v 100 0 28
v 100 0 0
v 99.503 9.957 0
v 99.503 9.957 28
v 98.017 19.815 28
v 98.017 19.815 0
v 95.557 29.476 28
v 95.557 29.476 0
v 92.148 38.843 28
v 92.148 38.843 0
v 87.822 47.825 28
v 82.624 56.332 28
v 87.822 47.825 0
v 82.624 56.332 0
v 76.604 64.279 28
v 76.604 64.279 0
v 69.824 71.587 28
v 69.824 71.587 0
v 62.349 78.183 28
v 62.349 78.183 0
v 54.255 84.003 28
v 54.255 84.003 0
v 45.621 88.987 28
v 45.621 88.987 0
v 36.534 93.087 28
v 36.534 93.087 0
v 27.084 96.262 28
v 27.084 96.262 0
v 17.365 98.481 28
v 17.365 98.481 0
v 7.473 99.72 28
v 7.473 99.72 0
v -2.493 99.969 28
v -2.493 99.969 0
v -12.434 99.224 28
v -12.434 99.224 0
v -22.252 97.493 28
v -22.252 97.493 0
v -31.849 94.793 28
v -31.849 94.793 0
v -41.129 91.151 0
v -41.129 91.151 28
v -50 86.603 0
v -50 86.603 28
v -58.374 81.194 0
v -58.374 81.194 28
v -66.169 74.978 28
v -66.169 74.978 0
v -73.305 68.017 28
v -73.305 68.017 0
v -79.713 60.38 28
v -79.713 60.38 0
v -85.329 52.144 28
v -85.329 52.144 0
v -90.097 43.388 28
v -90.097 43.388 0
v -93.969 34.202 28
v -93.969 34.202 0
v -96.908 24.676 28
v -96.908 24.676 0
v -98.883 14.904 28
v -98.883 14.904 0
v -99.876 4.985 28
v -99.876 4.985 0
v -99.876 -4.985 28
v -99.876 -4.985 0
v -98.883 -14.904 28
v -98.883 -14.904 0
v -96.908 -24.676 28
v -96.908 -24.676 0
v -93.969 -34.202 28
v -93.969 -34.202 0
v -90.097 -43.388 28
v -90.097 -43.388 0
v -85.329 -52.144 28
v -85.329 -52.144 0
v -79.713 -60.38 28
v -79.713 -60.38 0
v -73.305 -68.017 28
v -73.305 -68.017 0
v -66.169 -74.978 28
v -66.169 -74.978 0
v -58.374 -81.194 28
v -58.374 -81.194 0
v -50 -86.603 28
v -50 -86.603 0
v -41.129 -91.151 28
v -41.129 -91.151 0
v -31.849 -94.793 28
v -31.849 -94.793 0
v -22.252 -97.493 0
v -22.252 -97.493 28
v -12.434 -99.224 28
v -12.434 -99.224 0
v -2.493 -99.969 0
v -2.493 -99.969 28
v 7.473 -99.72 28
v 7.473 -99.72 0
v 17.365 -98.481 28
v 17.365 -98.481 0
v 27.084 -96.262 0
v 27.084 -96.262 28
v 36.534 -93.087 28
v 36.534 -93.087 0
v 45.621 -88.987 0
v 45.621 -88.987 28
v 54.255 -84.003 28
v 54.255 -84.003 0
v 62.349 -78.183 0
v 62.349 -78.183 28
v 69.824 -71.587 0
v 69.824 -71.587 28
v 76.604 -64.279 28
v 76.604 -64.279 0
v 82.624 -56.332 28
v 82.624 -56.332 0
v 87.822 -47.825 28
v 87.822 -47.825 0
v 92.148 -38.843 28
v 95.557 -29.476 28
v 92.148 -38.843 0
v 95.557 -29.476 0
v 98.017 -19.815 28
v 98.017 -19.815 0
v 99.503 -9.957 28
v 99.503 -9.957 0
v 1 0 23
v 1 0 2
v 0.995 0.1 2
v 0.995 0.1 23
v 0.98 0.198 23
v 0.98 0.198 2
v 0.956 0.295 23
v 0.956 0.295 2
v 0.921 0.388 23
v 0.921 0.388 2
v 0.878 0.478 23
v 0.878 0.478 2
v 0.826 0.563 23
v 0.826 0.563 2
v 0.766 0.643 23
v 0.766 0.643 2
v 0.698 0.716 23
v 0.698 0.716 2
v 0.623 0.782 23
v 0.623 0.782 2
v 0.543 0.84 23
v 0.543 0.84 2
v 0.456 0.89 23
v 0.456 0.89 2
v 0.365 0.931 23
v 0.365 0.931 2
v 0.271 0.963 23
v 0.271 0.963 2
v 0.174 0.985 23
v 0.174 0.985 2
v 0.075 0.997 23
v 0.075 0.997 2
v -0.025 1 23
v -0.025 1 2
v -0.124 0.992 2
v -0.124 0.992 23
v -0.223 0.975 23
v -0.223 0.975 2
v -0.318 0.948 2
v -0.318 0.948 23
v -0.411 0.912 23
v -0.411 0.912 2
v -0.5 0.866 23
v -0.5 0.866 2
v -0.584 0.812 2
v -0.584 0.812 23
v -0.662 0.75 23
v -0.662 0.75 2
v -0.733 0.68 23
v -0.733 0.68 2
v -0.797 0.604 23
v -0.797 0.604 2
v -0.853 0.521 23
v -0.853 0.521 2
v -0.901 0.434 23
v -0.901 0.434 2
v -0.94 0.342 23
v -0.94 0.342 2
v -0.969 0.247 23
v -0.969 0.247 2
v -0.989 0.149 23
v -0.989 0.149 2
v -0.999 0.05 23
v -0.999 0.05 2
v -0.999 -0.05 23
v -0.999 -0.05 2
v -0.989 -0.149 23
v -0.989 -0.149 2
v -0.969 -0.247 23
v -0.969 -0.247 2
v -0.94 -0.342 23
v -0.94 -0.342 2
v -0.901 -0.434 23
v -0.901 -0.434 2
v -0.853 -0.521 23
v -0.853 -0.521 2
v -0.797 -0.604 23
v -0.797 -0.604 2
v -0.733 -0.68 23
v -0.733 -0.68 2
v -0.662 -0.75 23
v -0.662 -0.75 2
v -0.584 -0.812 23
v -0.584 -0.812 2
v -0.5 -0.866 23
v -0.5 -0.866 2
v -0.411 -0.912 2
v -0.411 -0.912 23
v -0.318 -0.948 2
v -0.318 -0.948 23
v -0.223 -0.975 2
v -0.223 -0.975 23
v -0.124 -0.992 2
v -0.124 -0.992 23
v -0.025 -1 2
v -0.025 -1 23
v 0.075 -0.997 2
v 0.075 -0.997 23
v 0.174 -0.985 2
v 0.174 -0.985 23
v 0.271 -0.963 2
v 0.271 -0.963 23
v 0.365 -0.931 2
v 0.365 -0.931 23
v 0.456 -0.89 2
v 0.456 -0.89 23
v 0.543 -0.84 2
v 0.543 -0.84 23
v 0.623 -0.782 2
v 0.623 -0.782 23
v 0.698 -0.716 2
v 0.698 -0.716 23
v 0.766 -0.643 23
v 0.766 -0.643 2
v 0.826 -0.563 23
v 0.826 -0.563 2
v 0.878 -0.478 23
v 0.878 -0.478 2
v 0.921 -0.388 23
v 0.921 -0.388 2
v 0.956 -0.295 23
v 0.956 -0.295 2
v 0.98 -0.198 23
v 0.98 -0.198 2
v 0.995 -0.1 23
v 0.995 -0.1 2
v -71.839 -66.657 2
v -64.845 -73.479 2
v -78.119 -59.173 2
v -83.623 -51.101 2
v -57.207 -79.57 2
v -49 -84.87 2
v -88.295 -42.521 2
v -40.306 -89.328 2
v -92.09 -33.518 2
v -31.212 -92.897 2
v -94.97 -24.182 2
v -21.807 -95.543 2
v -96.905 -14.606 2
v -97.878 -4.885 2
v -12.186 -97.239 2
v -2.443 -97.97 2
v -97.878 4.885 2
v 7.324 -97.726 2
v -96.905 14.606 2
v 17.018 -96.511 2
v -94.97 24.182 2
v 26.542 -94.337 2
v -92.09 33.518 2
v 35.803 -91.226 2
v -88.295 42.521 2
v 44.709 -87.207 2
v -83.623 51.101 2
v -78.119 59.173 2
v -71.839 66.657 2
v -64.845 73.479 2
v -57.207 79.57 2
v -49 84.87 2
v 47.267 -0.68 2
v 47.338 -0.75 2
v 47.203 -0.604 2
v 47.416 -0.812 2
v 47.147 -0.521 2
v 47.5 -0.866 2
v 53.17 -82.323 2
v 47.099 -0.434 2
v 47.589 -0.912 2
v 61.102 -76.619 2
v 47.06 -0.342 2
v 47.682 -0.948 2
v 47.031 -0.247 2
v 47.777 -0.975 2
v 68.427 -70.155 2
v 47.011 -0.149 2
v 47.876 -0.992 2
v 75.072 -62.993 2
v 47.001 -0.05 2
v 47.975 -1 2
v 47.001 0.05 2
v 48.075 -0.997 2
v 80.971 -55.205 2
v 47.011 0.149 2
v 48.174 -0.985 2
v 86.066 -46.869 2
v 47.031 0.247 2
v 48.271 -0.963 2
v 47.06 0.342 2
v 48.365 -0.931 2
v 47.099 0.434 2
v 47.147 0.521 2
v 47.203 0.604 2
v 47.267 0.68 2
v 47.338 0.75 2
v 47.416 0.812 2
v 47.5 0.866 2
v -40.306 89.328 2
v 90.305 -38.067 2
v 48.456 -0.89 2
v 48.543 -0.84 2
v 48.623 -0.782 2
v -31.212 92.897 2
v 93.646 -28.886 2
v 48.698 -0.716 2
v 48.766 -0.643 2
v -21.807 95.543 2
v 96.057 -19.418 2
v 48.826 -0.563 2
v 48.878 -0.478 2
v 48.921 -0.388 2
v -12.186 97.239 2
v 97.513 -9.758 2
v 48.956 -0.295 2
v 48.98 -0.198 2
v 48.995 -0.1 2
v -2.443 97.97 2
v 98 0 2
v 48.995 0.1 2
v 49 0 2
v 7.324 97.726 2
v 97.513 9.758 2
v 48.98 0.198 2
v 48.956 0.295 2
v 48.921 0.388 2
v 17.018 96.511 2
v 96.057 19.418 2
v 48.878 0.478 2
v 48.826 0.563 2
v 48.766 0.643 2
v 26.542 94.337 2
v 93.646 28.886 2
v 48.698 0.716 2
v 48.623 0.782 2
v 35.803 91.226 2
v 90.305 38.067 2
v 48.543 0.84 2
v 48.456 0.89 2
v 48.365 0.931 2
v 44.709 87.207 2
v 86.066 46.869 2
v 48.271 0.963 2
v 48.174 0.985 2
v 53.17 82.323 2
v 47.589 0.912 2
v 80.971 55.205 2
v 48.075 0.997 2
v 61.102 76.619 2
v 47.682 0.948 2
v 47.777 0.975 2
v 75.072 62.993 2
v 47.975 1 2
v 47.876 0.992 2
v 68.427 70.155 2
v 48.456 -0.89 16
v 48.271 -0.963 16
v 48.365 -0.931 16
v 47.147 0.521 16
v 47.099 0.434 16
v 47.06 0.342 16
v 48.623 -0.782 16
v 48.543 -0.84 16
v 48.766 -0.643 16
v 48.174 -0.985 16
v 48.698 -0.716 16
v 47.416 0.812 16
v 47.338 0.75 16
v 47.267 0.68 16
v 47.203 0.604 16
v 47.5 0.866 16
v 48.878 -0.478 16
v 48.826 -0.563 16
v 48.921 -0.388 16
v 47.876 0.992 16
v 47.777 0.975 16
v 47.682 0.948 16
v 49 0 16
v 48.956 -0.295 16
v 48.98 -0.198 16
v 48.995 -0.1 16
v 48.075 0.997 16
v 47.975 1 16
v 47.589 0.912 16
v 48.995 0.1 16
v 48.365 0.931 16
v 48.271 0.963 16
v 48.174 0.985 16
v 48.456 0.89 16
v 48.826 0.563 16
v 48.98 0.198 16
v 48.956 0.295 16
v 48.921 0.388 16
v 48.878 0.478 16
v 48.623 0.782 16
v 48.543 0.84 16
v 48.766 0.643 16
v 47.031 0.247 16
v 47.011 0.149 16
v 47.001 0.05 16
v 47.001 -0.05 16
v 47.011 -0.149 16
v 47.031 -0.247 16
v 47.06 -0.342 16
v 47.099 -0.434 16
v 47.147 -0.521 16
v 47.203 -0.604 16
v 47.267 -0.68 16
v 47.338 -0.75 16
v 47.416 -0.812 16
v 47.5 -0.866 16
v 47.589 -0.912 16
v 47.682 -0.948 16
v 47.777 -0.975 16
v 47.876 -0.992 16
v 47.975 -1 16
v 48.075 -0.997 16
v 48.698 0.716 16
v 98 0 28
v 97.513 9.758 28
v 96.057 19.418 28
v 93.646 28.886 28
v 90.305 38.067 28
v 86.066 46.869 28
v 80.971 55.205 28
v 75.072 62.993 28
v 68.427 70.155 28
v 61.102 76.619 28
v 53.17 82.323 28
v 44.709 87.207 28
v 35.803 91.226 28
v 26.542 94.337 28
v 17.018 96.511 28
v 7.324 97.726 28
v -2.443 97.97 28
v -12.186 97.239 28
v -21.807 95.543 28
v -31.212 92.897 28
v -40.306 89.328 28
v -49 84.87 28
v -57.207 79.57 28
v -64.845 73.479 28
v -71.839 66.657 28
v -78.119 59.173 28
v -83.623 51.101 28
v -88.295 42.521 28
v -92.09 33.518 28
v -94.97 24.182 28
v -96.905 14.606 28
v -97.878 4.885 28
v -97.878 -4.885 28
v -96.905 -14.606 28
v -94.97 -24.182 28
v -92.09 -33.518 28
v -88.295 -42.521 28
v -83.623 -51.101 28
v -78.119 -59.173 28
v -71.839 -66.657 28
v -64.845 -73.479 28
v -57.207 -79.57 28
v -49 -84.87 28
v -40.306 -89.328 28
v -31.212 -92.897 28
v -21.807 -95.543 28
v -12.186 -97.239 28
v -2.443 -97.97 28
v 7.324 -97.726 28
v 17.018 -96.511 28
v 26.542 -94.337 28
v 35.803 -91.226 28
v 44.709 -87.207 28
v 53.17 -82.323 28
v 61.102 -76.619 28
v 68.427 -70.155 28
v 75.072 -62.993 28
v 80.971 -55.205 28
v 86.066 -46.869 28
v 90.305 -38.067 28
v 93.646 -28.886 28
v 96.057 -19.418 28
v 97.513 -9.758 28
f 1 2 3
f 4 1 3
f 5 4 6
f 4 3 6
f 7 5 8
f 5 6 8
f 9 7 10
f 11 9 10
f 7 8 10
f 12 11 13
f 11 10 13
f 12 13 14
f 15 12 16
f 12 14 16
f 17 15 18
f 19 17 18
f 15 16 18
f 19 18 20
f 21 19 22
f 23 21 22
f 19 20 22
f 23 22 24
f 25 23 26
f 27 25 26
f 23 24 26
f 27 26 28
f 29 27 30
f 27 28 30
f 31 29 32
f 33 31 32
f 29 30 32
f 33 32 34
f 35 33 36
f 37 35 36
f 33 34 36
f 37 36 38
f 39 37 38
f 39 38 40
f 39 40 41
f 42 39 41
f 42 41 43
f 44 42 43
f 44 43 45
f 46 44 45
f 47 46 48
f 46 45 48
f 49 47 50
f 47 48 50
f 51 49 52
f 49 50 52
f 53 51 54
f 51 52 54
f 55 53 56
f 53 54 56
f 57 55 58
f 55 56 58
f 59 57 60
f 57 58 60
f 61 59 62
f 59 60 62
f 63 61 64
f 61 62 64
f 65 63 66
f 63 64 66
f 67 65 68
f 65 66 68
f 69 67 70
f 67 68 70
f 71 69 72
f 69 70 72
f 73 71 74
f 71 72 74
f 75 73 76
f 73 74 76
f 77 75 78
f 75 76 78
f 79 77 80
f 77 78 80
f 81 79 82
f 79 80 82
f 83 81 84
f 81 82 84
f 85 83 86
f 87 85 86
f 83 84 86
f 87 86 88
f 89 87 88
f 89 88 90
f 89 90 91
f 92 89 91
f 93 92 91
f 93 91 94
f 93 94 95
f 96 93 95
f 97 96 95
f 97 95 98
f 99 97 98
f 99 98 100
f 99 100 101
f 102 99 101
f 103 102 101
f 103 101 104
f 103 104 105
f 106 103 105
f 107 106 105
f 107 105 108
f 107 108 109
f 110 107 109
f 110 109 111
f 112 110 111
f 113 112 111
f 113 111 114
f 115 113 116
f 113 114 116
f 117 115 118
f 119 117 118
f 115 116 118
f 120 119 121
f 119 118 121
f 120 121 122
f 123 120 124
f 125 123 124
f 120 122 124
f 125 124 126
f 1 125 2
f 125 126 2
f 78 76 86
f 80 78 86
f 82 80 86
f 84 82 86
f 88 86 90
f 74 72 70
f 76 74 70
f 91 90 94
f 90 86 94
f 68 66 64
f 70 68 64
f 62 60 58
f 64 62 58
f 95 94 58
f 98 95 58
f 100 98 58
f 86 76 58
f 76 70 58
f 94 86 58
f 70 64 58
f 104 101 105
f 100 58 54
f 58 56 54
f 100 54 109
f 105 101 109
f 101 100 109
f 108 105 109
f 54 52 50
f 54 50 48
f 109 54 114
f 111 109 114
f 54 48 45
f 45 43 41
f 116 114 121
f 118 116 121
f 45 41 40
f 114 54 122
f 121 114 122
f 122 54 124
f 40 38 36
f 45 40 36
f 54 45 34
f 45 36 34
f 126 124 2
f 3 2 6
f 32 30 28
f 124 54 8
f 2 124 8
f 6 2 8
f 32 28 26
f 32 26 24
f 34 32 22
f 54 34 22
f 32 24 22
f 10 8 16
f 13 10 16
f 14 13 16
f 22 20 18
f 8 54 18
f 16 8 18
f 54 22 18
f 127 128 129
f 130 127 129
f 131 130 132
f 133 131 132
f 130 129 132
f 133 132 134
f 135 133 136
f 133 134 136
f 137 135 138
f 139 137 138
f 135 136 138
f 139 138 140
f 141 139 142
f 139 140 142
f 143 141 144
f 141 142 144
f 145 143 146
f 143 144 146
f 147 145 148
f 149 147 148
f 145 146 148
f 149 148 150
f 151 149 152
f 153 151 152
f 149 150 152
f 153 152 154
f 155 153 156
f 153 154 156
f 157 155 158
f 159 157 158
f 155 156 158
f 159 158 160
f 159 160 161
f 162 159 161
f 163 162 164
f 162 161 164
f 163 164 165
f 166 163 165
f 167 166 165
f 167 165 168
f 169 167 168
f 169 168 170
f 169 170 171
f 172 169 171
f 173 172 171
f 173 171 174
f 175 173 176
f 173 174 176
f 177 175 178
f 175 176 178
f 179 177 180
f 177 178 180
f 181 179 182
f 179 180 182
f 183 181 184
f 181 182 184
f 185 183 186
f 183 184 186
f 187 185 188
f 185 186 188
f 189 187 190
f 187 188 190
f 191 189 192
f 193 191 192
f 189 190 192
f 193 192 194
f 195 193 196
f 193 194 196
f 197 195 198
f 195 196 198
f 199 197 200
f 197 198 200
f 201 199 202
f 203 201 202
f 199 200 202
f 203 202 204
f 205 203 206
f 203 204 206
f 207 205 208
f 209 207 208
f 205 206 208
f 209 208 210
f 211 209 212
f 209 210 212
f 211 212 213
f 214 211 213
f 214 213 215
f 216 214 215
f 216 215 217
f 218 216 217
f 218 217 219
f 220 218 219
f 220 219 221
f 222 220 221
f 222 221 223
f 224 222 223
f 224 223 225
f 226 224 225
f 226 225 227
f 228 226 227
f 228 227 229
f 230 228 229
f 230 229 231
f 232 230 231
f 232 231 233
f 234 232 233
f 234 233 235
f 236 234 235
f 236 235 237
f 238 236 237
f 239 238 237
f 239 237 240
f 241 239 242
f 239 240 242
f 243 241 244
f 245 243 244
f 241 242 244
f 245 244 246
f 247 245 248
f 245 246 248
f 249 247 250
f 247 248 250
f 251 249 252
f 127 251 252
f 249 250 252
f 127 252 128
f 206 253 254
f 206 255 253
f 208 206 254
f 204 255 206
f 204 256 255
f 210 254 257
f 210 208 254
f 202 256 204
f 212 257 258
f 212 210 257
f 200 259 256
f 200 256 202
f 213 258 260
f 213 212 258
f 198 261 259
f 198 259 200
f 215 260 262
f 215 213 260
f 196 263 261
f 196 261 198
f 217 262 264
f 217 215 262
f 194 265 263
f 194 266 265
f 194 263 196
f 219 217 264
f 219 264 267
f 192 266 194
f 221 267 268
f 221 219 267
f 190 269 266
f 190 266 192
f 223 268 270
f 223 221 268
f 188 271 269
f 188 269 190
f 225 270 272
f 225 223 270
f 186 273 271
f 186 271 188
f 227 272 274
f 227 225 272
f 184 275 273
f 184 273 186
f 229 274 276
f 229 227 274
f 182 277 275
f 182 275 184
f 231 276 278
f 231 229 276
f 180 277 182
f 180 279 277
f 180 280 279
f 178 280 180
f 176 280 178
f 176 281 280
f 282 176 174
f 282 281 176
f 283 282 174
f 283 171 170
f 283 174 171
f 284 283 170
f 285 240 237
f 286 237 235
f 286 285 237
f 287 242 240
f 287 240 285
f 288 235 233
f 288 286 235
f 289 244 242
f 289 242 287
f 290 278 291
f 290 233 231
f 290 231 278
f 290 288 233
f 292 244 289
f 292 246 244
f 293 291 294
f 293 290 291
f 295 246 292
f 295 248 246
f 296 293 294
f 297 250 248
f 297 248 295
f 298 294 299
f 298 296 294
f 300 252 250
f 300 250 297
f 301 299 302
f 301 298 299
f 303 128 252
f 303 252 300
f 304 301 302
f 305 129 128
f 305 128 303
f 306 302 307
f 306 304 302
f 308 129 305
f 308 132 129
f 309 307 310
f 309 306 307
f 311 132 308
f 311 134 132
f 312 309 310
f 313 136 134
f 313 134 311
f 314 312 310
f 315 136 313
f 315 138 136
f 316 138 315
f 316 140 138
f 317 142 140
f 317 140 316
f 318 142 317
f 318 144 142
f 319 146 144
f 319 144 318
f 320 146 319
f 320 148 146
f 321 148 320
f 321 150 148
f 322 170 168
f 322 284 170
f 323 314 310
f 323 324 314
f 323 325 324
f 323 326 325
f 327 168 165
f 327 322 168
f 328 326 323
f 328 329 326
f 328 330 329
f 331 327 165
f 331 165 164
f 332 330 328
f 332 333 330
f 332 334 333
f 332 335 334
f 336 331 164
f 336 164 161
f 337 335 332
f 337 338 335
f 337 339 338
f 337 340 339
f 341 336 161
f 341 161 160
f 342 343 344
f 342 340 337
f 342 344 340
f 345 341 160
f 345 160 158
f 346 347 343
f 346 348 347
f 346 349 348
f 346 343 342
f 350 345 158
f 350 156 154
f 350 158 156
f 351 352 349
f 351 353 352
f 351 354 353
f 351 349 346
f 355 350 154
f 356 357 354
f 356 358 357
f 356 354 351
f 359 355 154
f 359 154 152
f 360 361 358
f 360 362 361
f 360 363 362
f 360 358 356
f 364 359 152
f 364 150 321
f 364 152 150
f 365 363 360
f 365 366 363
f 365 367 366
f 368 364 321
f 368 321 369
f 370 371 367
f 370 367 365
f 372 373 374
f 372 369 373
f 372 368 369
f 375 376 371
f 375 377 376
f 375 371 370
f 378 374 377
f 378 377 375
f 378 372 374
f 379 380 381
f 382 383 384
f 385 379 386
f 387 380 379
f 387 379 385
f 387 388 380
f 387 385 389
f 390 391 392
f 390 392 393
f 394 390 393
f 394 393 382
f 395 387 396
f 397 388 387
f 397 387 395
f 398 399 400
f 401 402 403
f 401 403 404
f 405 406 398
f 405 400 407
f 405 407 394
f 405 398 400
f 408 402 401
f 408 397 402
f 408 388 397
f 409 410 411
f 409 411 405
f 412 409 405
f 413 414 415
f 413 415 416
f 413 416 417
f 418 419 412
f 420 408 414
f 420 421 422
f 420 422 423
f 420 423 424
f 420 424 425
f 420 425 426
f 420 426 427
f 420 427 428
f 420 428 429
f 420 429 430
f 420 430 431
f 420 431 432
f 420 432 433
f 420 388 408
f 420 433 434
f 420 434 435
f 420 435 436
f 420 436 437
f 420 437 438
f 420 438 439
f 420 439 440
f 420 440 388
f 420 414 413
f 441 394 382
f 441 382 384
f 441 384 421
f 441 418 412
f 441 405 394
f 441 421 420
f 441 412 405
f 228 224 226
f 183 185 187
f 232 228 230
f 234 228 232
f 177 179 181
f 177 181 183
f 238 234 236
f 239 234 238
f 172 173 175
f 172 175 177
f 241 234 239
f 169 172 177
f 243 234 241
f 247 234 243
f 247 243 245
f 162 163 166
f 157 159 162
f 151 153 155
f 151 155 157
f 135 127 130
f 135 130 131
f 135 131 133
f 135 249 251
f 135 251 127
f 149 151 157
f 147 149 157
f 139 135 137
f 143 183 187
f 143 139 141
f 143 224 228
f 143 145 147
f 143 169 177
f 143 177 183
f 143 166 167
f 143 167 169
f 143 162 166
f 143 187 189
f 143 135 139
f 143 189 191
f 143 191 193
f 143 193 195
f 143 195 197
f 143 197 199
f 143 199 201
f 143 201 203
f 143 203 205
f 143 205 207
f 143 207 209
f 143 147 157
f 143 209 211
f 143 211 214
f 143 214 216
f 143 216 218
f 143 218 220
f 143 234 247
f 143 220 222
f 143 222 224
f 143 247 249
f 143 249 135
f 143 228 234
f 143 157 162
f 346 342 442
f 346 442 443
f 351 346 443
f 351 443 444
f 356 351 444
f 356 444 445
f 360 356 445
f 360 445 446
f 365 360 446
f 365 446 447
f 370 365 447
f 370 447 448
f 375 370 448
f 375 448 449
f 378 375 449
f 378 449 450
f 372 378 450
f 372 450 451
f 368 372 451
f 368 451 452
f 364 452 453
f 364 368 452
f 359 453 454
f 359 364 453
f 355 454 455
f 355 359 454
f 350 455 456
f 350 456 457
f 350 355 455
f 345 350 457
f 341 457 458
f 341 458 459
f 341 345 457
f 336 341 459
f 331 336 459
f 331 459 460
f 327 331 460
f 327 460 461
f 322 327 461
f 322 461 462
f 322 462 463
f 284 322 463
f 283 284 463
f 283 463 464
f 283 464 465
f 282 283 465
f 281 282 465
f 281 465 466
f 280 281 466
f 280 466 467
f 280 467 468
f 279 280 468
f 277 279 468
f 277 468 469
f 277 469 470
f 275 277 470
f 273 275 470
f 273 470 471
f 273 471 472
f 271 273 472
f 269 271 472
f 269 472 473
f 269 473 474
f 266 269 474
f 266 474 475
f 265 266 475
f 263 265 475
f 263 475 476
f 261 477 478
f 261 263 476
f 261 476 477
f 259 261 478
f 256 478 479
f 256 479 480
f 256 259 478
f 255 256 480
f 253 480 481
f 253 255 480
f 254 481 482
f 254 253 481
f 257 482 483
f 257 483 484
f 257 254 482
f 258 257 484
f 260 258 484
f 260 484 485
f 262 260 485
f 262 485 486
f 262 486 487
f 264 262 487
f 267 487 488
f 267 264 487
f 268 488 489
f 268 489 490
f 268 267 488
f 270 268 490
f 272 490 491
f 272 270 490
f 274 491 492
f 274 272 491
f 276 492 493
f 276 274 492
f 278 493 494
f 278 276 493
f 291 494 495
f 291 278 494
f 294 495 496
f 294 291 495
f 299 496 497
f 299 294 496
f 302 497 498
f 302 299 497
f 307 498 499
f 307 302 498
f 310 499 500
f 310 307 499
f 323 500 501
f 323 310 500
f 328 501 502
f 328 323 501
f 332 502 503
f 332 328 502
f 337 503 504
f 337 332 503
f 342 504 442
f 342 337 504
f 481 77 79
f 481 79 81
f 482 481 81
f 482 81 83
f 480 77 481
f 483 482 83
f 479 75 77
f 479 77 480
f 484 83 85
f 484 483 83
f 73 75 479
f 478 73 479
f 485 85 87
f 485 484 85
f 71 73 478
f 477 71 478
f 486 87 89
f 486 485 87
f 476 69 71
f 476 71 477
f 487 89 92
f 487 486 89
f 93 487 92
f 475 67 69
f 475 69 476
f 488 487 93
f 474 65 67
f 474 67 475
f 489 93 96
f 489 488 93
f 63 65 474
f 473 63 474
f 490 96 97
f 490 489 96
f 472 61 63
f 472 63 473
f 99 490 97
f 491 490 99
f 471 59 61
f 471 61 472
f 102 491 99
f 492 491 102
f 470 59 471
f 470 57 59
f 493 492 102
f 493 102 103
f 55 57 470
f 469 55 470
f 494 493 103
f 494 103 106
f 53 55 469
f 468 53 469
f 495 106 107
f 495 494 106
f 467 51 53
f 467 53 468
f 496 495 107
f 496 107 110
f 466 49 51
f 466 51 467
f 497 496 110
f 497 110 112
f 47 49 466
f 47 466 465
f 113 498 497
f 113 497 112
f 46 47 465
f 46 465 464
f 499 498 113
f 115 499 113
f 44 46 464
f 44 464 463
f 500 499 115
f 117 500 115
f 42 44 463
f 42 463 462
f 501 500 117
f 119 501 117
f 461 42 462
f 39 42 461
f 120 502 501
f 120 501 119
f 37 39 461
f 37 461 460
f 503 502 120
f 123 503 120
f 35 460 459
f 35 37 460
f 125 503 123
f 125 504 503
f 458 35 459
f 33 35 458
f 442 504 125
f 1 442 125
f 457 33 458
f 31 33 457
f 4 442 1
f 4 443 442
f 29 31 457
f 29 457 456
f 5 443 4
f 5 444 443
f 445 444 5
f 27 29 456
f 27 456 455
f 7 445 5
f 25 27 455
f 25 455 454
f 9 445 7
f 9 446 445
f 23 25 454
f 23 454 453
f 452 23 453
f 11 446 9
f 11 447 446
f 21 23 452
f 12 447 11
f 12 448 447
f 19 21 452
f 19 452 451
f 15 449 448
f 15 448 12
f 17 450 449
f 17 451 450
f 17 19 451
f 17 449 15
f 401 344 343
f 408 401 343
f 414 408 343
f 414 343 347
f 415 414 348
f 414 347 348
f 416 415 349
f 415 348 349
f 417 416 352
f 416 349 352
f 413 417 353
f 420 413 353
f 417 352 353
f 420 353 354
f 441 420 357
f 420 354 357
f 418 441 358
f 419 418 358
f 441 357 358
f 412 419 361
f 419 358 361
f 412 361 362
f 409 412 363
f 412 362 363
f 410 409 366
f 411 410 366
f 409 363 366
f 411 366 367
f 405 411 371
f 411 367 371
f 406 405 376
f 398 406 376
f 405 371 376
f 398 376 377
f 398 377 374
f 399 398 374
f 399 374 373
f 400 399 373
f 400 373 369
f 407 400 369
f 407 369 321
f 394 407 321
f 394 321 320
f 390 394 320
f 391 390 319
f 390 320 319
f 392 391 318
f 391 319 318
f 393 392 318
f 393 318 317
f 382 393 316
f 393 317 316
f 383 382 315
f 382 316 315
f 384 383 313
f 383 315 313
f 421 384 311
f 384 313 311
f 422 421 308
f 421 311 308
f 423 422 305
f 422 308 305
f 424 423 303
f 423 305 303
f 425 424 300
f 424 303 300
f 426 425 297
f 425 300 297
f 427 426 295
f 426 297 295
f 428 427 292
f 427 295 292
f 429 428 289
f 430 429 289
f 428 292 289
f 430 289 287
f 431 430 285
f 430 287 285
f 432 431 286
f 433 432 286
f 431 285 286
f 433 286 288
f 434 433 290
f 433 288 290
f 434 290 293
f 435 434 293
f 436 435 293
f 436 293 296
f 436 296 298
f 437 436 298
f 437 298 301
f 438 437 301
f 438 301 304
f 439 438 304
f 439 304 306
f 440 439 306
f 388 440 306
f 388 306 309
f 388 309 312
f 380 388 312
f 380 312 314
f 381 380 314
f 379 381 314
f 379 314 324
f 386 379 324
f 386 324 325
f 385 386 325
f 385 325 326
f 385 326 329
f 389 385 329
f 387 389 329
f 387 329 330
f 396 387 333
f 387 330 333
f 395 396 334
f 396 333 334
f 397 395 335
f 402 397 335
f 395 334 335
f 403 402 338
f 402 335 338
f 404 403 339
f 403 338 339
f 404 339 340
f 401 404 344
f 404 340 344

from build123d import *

# Parameters (mm, degrees)
F0_R     = 100
F1_DEPTH = 28
F2_T     = -2
F3_R     = 1
F4_DEPTH = 21
F5_R     = 1
F6_DEPTH = 14


with BuildPart() as f1:
    # F0 (on Top) → F1 (new body)
    with BuildSketch(Plane.XY):
        Circle(F0_R)
    extrude(amount=F1_DEPTH)

    # F2
    f2_openings = [f1.faces().sort_by_distance(p)[0] for p in [
        (0, 0, 28),
    ]]
    offset(amount=F2_T, openings=f2_openings)

    # F3 (on face) → F4 (join)
    with BuildSketch(Plane.XY.offset(2)):
        Circle(F3_R)
    extrude(amount=F4_DEPTH)

    # F5 (on face) → F6 (join)
    with BuildSketch(Plane.XY.offset(2)):
        with Locations((48, 0)):
            Circle(F5_R)
    extrude(amount=F6_DEPTH)


solid = f1.part
